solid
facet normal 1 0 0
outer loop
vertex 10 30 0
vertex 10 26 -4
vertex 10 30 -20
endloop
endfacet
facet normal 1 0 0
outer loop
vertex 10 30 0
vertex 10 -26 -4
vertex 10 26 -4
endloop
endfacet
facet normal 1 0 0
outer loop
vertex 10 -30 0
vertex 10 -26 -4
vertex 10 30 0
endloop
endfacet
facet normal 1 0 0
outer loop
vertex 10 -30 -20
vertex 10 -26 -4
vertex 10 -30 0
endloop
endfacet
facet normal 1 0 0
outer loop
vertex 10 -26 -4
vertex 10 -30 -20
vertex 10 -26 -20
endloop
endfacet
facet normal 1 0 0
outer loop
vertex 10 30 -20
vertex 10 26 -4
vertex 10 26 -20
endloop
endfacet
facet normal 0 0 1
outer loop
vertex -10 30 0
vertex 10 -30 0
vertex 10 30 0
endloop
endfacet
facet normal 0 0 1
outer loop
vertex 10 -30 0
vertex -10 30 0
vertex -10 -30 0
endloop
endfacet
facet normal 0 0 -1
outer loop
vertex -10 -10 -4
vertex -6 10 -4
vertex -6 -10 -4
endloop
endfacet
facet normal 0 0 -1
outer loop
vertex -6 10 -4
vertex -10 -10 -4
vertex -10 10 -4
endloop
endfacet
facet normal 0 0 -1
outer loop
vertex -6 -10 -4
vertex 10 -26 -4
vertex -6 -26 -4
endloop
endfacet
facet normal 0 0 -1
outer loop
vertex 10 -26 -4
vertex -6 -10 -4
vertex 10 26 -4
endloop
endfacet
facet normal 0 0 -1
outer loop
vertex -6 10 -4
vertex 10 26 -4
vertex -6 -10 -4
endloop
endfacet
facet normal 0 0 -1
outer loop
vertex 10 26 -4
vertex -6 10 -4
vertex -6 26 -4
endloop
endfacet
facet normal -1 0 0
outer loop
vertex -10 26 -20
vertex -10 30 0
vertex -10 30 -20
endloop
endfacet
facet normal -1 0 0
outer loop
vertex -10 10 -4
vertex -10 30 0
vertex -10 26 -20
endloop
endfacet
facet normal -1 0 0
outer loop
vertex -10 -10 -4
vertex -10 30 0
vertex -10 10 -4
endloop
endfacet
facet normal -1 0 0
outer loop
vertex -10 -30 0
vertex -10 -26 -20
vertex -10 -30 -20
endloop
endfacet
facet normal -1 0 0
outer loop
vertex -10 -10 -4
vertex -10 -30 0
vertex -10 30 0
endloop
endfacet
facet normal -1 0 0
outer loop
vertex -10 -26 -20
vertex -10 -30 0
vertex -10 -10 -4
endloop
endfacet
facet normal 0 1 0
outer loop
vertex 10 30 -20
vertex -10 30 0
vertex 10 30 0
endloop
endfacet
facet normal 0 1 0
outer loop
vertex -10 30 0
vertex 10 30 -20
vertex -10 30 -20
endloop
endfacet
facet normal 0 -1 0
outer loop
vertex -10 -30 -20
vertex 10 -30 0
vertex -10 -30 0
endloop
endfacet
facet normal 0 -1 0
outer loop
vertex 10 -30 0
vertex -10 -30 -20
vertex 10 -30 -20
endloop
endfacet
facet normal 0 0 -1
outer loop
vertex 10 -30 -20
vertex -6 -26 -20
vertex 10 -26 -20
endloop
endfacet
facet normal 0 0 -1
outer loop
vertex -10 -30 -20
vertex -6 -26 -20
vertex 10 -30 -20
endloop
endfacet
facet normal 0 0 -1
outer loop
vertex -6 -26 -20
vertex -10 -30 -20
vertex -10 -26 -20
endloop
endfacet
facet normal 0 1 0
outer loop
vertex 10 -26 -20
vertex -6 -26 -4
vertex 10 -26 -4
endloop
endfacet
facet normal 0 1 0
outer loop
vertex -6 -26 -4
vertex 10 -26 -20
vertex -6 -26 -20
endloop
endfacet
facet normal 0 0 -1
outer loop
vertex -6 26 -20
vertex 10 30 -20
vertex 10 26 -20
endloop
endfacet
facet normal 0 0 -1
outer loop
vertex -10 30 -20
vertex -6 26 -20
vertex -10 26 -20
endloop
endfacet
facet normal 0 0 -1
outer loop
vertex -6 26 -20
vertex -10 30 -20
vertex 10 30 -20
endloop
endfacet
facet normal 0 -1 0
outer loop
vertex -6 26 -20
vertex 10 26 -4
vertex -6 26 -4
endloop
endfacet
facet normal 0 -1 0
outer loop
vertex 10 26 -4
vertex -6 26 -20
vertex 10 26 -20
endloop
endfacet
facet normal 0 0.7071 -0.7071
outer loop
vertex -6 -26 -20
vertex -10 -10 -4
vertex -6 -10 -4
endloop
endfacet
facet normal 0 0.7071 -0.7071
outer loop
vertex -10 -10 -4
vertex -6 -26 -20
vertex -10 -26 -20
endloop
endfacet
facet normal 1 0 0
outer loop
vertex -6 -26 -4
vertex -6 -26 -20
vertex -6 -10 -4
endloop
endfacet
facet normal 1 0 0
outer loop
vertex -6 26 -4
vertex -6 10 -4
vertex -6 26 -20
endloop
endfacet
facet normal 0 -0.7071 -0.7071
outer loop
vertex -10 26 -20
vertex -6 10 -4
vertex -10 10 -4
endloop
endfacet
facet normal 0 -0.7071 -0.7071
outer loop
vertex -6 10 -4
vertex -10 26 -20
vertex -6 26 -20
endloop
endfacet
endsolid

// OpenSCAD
// file: ../parameters.scad
global_clearance = 0.5;

layer_thickness = 0.3;

//Main tube diameter - hole [mm]
main_tube_outer_diameter = 25.4;
main_tube_inner_diameter = 23.05;

// Nastavení parametrů rotoru

gliding_aggle = 14;         // tenhle úhel by se zřejmě v budoucnu měl počítat z požadované klouzavosti.

rotor_blade_AOA = 1.5;      // nastavení úhlu náběhu rotorového listu

// Rotor Auto-G2
rotor_blade_rod = true;  // generovat diru pro uhlikove tycky
rotor_blade_length = 400 - 15;   // délka rotorového listu
rotor_blade_depth = 45.5;     // hloubka rotorového listu


blade_mount_length = 30;

blade_mount_width = 17;
blade_mount_thickness = 4.6;
blade_mount_screw_offset = 5; // distance of first screw from rotor end

// Testovaci maly rotor

        /*
        rotor_blade_rod = false;
        rotor_blade_length = 145;   // délka rotorového listu
        rotor_blade_depth = 45.5 * (145/385);     // hloubka rotorového listu
        blade_mount_length = 20;
        blade_mount_width = 10;
        blade_mount_thickness = 4;
        */

// konec parametru pro testovaci maly rotor

rotor_height = 180;         // výška otočného kloubu rotoru nad hlavní trubkou vírníku (odhad)
rotor_blades_count = 2;
rotor_delta_angle = 12;
rotor_blade_thickness = 5.1;

rotor_blade_naca = 2412;
rotor_blade_parts_count = 3;

blade_transition_length = 10; // length of blade transition

blade_mount_screw_distance = (16.47+11.86)/2;

/* blade_shell_thickness = 0.4;
blade_shell_thickness_inner = 0.4;
blade_shell_thickness_wire = 0.4;
blade_infill_distance = 25;
blade_infill_overlap = 0; */

/// Nastaveni pro Slic3r
blade_shell_thickness = 0.45;
blade_shell_thickness_inner = 0.43;
blade_shell_thickness_wire = 0.45;
blade_infill_distance = 20;
blade_infill_overlap = 0;


//blade_rod_position = [rotor_blade_depth/4 + 5, 0, 0];
//blade_rod_position2 = [rotor_blade_depth/4 - 5, 0, 0];

//blade_rod_position = [15, 0, 0];
//blade_rod_position2 = [4, 0.3, 0];

blade_rod1_diameter = 2.58;
blade_rod2_diameter = 2.58;
blade_rod3_diameter = 2.13;

blade_rod1_position = [3.4, 0.3, 0];
blade_rod2_position = [rotor_blade_depth/4 - 4, 0.2, 0];
blade_rod3_position = [rotor_blade_depth/4 + 3.5, 0, 0];


rotor_head_width =  21.4;    //Rozměr 1 v nákresu
pilon_wall_thickness = 4.2;  // Rozměr 2 v nákresu
horizontal_screw_distance = 14.5;   // Rozměr 4 v nákresu
vertical_screw_distance = 12;       // rozměr 5 v nkresu
topscrew_distance_endofpilon = 5;

rotorhead_wall_thickness = 2; // sila tistenych dilu


bearing_outer_diameter = 10.2;    // Rozměr B1 v nákresu s přídavkem na toleranci otvoru
bearing_thickness = 4;        // Rozměr B2 v nákresu
//bearing_shaft_length = 19.5;    // Rozměr B3 v nákresu, Originalni hodnota 19.5
bearing_shaft_length = 20;    // Rozměr B3 v nákresu


// nastavení parametrů motoru

engine_angle = -8;
engine_diameter = 55;
engine_offset = 55;

engine_screws_radius = 15;
engine_holes_radius = (24 + 44)/4;
engine_shatf_hole_diameter = 13;

// screw length step - minimum difference in length between two types of screws
basic_screw_length = 5;

//Screw diameter and nut for M6 [mm]
M6_screw_diameter=6.5;
M6_head_diameter = 10+0.5;
M6_head_height = 6;
M6_nut_height = 4.9;
M6_nut_diameter = 11.8;
M6_nut_pocket = 10.4;

//Screw diameter and nut for M5 [mm]
M5_screw_diameter=5.5;
M5_head_height = 5;
M5_head_diameter = 13+0.5;
M5_nut_height = 4.5;
M5_nut_diameter = 9.4;
M5_nut_pocket = 8.4;

//Screw diameter and nut for M4 [mm]
M4_screw_diameter=4.5;
M4_screw_head_height = 4;
M4_nut_height = 3.2;
M4_nut_diameter = 8.4;
M4_nut_pocket = 7.5;

//Screw diameter and nut for M3 [mm]
M3_screw_diameter = 3.2;
M3_nut_height = 2.7;
M3_nut_diameter = 6.6;
M3_screw_head_height = 3;
M3_nut_pocket = 5.6;


//Screw diameter and nut for M2,5 [mm]
M2_5_screw_diameter = 2.7;
M2_5_nut_height = 2.3;
M2_5_nut_diameter = 6;
M2_5_nut_pocket = 5.1;

//Screw diameter and nut for M2 [mm]
M2_screw_diameter = 2.0;
M2_nut_height = 1.8;
M2_nut_diameter = 4.8;
M2_nut_pocket = 3.95;


blade_mount_screw = M2_screw_diameter;
blade_mount_nut = M2_nut_diameter;


//šroub servo
Servo_screw = 1.5;
Servo_nut_height = 1;
Servo_nut_diameter = 2.7;

tail_pipes_distance = 10.16*5;
tail_pipes_diameter = M4_screw_diameter;
tail_pipes_min_wall = 3;

//center_of_gravity_position = [main_pilon_position - tan(gliding_aggle)*rotor_height, 0, 0];


base_patern = 10.16;
////podzvozek

radius_undercarriage = 25;
vzdalenost_x = tan(20) * 131;
vzdalenost_y = (131 - radius_undercarriage)/tan(79);
uhel_y = 90 - 20;
uhel_x = 90 - 79;

maximum_printable_size = 150;


////Pitotova trubice
Pitot_tube_diameter = 4.02 + 1;
Distance_hole_from_tube = 11.92;  //vzdálenost otvoru pro připevnění od samotné trubičky


////Vlečné zařízení
tow_ring_diameter = 20;
tow_ring_thickness = 5;
tow_ring_groove = 2;
tow_ring_hole_diameter = M3_screw_diameter;

////Simoniny parametry pro nosník rotoru
base_length = 290; //delka podlozky
base_split_position = [0, 145, base_length];
base_width = 60; //sirka podlozky - vnější šířka nosníku
base_thickness = 4; //vyska podlozky
base_patern = 10;
rantl_thickness = 4; //sirka steny podlozky
rantl_height = 8;
niy=4; //pocet der podelne
// main file
include <../parameters.scad>


suspension_holder_length = 20;
suspension_holder_height = 20;
suspension_holder_thickness = 4;



module 888_1004(){

    translate([-suspension_holder_length/2, -base_width/2, -suspension_holder_thickness])
        cube([suspension_holder_length, base_width, suspension_holder_thickness]);

    translate([-suspension_holder_length/2, -base_width/2, -suspension_holder_height])
        cube([suspension_holder_length, suspension_holder_thickness, suspension_holder_height]);

    translate([-suspension_holder_length/2, base_width/2 -suspension_holder_thickness, -suspension_holder_height])
        cube([suspension_holder_length, suspension_holder_thickness, suspension_holder_height]);


    hull(){
        translate([-suspension_holder_length/2, -base_width/2, -suspension_holder_height])
            cube([suspension_holder_thickness, suspension_holder_thickness, suspension_holder_height]);
        translate([-suspension_holder_length/2, -base_width/2, -suspension_holder_thickness])
            cube([suspension_holder_thickness, suspension_holder_height, suspension_holder_thickness]);
        }

    hull(){
        translate([-suspension_holder_length/2, base_width/2 - suspension_holder_thickness, -suspension_holder_height])
            cube([suspension_holder_thickness, suspension_holder_thickness, suspension_holder_height]);
        translate([-suspension_holder_length/2, base_width/2 - suspension_holder_height, -suspension_holder_thickness])
            cube([suspension_holder_thickness, suspension_holder_height, suspension_holder_thickness]);
        }

}

888_1004();
